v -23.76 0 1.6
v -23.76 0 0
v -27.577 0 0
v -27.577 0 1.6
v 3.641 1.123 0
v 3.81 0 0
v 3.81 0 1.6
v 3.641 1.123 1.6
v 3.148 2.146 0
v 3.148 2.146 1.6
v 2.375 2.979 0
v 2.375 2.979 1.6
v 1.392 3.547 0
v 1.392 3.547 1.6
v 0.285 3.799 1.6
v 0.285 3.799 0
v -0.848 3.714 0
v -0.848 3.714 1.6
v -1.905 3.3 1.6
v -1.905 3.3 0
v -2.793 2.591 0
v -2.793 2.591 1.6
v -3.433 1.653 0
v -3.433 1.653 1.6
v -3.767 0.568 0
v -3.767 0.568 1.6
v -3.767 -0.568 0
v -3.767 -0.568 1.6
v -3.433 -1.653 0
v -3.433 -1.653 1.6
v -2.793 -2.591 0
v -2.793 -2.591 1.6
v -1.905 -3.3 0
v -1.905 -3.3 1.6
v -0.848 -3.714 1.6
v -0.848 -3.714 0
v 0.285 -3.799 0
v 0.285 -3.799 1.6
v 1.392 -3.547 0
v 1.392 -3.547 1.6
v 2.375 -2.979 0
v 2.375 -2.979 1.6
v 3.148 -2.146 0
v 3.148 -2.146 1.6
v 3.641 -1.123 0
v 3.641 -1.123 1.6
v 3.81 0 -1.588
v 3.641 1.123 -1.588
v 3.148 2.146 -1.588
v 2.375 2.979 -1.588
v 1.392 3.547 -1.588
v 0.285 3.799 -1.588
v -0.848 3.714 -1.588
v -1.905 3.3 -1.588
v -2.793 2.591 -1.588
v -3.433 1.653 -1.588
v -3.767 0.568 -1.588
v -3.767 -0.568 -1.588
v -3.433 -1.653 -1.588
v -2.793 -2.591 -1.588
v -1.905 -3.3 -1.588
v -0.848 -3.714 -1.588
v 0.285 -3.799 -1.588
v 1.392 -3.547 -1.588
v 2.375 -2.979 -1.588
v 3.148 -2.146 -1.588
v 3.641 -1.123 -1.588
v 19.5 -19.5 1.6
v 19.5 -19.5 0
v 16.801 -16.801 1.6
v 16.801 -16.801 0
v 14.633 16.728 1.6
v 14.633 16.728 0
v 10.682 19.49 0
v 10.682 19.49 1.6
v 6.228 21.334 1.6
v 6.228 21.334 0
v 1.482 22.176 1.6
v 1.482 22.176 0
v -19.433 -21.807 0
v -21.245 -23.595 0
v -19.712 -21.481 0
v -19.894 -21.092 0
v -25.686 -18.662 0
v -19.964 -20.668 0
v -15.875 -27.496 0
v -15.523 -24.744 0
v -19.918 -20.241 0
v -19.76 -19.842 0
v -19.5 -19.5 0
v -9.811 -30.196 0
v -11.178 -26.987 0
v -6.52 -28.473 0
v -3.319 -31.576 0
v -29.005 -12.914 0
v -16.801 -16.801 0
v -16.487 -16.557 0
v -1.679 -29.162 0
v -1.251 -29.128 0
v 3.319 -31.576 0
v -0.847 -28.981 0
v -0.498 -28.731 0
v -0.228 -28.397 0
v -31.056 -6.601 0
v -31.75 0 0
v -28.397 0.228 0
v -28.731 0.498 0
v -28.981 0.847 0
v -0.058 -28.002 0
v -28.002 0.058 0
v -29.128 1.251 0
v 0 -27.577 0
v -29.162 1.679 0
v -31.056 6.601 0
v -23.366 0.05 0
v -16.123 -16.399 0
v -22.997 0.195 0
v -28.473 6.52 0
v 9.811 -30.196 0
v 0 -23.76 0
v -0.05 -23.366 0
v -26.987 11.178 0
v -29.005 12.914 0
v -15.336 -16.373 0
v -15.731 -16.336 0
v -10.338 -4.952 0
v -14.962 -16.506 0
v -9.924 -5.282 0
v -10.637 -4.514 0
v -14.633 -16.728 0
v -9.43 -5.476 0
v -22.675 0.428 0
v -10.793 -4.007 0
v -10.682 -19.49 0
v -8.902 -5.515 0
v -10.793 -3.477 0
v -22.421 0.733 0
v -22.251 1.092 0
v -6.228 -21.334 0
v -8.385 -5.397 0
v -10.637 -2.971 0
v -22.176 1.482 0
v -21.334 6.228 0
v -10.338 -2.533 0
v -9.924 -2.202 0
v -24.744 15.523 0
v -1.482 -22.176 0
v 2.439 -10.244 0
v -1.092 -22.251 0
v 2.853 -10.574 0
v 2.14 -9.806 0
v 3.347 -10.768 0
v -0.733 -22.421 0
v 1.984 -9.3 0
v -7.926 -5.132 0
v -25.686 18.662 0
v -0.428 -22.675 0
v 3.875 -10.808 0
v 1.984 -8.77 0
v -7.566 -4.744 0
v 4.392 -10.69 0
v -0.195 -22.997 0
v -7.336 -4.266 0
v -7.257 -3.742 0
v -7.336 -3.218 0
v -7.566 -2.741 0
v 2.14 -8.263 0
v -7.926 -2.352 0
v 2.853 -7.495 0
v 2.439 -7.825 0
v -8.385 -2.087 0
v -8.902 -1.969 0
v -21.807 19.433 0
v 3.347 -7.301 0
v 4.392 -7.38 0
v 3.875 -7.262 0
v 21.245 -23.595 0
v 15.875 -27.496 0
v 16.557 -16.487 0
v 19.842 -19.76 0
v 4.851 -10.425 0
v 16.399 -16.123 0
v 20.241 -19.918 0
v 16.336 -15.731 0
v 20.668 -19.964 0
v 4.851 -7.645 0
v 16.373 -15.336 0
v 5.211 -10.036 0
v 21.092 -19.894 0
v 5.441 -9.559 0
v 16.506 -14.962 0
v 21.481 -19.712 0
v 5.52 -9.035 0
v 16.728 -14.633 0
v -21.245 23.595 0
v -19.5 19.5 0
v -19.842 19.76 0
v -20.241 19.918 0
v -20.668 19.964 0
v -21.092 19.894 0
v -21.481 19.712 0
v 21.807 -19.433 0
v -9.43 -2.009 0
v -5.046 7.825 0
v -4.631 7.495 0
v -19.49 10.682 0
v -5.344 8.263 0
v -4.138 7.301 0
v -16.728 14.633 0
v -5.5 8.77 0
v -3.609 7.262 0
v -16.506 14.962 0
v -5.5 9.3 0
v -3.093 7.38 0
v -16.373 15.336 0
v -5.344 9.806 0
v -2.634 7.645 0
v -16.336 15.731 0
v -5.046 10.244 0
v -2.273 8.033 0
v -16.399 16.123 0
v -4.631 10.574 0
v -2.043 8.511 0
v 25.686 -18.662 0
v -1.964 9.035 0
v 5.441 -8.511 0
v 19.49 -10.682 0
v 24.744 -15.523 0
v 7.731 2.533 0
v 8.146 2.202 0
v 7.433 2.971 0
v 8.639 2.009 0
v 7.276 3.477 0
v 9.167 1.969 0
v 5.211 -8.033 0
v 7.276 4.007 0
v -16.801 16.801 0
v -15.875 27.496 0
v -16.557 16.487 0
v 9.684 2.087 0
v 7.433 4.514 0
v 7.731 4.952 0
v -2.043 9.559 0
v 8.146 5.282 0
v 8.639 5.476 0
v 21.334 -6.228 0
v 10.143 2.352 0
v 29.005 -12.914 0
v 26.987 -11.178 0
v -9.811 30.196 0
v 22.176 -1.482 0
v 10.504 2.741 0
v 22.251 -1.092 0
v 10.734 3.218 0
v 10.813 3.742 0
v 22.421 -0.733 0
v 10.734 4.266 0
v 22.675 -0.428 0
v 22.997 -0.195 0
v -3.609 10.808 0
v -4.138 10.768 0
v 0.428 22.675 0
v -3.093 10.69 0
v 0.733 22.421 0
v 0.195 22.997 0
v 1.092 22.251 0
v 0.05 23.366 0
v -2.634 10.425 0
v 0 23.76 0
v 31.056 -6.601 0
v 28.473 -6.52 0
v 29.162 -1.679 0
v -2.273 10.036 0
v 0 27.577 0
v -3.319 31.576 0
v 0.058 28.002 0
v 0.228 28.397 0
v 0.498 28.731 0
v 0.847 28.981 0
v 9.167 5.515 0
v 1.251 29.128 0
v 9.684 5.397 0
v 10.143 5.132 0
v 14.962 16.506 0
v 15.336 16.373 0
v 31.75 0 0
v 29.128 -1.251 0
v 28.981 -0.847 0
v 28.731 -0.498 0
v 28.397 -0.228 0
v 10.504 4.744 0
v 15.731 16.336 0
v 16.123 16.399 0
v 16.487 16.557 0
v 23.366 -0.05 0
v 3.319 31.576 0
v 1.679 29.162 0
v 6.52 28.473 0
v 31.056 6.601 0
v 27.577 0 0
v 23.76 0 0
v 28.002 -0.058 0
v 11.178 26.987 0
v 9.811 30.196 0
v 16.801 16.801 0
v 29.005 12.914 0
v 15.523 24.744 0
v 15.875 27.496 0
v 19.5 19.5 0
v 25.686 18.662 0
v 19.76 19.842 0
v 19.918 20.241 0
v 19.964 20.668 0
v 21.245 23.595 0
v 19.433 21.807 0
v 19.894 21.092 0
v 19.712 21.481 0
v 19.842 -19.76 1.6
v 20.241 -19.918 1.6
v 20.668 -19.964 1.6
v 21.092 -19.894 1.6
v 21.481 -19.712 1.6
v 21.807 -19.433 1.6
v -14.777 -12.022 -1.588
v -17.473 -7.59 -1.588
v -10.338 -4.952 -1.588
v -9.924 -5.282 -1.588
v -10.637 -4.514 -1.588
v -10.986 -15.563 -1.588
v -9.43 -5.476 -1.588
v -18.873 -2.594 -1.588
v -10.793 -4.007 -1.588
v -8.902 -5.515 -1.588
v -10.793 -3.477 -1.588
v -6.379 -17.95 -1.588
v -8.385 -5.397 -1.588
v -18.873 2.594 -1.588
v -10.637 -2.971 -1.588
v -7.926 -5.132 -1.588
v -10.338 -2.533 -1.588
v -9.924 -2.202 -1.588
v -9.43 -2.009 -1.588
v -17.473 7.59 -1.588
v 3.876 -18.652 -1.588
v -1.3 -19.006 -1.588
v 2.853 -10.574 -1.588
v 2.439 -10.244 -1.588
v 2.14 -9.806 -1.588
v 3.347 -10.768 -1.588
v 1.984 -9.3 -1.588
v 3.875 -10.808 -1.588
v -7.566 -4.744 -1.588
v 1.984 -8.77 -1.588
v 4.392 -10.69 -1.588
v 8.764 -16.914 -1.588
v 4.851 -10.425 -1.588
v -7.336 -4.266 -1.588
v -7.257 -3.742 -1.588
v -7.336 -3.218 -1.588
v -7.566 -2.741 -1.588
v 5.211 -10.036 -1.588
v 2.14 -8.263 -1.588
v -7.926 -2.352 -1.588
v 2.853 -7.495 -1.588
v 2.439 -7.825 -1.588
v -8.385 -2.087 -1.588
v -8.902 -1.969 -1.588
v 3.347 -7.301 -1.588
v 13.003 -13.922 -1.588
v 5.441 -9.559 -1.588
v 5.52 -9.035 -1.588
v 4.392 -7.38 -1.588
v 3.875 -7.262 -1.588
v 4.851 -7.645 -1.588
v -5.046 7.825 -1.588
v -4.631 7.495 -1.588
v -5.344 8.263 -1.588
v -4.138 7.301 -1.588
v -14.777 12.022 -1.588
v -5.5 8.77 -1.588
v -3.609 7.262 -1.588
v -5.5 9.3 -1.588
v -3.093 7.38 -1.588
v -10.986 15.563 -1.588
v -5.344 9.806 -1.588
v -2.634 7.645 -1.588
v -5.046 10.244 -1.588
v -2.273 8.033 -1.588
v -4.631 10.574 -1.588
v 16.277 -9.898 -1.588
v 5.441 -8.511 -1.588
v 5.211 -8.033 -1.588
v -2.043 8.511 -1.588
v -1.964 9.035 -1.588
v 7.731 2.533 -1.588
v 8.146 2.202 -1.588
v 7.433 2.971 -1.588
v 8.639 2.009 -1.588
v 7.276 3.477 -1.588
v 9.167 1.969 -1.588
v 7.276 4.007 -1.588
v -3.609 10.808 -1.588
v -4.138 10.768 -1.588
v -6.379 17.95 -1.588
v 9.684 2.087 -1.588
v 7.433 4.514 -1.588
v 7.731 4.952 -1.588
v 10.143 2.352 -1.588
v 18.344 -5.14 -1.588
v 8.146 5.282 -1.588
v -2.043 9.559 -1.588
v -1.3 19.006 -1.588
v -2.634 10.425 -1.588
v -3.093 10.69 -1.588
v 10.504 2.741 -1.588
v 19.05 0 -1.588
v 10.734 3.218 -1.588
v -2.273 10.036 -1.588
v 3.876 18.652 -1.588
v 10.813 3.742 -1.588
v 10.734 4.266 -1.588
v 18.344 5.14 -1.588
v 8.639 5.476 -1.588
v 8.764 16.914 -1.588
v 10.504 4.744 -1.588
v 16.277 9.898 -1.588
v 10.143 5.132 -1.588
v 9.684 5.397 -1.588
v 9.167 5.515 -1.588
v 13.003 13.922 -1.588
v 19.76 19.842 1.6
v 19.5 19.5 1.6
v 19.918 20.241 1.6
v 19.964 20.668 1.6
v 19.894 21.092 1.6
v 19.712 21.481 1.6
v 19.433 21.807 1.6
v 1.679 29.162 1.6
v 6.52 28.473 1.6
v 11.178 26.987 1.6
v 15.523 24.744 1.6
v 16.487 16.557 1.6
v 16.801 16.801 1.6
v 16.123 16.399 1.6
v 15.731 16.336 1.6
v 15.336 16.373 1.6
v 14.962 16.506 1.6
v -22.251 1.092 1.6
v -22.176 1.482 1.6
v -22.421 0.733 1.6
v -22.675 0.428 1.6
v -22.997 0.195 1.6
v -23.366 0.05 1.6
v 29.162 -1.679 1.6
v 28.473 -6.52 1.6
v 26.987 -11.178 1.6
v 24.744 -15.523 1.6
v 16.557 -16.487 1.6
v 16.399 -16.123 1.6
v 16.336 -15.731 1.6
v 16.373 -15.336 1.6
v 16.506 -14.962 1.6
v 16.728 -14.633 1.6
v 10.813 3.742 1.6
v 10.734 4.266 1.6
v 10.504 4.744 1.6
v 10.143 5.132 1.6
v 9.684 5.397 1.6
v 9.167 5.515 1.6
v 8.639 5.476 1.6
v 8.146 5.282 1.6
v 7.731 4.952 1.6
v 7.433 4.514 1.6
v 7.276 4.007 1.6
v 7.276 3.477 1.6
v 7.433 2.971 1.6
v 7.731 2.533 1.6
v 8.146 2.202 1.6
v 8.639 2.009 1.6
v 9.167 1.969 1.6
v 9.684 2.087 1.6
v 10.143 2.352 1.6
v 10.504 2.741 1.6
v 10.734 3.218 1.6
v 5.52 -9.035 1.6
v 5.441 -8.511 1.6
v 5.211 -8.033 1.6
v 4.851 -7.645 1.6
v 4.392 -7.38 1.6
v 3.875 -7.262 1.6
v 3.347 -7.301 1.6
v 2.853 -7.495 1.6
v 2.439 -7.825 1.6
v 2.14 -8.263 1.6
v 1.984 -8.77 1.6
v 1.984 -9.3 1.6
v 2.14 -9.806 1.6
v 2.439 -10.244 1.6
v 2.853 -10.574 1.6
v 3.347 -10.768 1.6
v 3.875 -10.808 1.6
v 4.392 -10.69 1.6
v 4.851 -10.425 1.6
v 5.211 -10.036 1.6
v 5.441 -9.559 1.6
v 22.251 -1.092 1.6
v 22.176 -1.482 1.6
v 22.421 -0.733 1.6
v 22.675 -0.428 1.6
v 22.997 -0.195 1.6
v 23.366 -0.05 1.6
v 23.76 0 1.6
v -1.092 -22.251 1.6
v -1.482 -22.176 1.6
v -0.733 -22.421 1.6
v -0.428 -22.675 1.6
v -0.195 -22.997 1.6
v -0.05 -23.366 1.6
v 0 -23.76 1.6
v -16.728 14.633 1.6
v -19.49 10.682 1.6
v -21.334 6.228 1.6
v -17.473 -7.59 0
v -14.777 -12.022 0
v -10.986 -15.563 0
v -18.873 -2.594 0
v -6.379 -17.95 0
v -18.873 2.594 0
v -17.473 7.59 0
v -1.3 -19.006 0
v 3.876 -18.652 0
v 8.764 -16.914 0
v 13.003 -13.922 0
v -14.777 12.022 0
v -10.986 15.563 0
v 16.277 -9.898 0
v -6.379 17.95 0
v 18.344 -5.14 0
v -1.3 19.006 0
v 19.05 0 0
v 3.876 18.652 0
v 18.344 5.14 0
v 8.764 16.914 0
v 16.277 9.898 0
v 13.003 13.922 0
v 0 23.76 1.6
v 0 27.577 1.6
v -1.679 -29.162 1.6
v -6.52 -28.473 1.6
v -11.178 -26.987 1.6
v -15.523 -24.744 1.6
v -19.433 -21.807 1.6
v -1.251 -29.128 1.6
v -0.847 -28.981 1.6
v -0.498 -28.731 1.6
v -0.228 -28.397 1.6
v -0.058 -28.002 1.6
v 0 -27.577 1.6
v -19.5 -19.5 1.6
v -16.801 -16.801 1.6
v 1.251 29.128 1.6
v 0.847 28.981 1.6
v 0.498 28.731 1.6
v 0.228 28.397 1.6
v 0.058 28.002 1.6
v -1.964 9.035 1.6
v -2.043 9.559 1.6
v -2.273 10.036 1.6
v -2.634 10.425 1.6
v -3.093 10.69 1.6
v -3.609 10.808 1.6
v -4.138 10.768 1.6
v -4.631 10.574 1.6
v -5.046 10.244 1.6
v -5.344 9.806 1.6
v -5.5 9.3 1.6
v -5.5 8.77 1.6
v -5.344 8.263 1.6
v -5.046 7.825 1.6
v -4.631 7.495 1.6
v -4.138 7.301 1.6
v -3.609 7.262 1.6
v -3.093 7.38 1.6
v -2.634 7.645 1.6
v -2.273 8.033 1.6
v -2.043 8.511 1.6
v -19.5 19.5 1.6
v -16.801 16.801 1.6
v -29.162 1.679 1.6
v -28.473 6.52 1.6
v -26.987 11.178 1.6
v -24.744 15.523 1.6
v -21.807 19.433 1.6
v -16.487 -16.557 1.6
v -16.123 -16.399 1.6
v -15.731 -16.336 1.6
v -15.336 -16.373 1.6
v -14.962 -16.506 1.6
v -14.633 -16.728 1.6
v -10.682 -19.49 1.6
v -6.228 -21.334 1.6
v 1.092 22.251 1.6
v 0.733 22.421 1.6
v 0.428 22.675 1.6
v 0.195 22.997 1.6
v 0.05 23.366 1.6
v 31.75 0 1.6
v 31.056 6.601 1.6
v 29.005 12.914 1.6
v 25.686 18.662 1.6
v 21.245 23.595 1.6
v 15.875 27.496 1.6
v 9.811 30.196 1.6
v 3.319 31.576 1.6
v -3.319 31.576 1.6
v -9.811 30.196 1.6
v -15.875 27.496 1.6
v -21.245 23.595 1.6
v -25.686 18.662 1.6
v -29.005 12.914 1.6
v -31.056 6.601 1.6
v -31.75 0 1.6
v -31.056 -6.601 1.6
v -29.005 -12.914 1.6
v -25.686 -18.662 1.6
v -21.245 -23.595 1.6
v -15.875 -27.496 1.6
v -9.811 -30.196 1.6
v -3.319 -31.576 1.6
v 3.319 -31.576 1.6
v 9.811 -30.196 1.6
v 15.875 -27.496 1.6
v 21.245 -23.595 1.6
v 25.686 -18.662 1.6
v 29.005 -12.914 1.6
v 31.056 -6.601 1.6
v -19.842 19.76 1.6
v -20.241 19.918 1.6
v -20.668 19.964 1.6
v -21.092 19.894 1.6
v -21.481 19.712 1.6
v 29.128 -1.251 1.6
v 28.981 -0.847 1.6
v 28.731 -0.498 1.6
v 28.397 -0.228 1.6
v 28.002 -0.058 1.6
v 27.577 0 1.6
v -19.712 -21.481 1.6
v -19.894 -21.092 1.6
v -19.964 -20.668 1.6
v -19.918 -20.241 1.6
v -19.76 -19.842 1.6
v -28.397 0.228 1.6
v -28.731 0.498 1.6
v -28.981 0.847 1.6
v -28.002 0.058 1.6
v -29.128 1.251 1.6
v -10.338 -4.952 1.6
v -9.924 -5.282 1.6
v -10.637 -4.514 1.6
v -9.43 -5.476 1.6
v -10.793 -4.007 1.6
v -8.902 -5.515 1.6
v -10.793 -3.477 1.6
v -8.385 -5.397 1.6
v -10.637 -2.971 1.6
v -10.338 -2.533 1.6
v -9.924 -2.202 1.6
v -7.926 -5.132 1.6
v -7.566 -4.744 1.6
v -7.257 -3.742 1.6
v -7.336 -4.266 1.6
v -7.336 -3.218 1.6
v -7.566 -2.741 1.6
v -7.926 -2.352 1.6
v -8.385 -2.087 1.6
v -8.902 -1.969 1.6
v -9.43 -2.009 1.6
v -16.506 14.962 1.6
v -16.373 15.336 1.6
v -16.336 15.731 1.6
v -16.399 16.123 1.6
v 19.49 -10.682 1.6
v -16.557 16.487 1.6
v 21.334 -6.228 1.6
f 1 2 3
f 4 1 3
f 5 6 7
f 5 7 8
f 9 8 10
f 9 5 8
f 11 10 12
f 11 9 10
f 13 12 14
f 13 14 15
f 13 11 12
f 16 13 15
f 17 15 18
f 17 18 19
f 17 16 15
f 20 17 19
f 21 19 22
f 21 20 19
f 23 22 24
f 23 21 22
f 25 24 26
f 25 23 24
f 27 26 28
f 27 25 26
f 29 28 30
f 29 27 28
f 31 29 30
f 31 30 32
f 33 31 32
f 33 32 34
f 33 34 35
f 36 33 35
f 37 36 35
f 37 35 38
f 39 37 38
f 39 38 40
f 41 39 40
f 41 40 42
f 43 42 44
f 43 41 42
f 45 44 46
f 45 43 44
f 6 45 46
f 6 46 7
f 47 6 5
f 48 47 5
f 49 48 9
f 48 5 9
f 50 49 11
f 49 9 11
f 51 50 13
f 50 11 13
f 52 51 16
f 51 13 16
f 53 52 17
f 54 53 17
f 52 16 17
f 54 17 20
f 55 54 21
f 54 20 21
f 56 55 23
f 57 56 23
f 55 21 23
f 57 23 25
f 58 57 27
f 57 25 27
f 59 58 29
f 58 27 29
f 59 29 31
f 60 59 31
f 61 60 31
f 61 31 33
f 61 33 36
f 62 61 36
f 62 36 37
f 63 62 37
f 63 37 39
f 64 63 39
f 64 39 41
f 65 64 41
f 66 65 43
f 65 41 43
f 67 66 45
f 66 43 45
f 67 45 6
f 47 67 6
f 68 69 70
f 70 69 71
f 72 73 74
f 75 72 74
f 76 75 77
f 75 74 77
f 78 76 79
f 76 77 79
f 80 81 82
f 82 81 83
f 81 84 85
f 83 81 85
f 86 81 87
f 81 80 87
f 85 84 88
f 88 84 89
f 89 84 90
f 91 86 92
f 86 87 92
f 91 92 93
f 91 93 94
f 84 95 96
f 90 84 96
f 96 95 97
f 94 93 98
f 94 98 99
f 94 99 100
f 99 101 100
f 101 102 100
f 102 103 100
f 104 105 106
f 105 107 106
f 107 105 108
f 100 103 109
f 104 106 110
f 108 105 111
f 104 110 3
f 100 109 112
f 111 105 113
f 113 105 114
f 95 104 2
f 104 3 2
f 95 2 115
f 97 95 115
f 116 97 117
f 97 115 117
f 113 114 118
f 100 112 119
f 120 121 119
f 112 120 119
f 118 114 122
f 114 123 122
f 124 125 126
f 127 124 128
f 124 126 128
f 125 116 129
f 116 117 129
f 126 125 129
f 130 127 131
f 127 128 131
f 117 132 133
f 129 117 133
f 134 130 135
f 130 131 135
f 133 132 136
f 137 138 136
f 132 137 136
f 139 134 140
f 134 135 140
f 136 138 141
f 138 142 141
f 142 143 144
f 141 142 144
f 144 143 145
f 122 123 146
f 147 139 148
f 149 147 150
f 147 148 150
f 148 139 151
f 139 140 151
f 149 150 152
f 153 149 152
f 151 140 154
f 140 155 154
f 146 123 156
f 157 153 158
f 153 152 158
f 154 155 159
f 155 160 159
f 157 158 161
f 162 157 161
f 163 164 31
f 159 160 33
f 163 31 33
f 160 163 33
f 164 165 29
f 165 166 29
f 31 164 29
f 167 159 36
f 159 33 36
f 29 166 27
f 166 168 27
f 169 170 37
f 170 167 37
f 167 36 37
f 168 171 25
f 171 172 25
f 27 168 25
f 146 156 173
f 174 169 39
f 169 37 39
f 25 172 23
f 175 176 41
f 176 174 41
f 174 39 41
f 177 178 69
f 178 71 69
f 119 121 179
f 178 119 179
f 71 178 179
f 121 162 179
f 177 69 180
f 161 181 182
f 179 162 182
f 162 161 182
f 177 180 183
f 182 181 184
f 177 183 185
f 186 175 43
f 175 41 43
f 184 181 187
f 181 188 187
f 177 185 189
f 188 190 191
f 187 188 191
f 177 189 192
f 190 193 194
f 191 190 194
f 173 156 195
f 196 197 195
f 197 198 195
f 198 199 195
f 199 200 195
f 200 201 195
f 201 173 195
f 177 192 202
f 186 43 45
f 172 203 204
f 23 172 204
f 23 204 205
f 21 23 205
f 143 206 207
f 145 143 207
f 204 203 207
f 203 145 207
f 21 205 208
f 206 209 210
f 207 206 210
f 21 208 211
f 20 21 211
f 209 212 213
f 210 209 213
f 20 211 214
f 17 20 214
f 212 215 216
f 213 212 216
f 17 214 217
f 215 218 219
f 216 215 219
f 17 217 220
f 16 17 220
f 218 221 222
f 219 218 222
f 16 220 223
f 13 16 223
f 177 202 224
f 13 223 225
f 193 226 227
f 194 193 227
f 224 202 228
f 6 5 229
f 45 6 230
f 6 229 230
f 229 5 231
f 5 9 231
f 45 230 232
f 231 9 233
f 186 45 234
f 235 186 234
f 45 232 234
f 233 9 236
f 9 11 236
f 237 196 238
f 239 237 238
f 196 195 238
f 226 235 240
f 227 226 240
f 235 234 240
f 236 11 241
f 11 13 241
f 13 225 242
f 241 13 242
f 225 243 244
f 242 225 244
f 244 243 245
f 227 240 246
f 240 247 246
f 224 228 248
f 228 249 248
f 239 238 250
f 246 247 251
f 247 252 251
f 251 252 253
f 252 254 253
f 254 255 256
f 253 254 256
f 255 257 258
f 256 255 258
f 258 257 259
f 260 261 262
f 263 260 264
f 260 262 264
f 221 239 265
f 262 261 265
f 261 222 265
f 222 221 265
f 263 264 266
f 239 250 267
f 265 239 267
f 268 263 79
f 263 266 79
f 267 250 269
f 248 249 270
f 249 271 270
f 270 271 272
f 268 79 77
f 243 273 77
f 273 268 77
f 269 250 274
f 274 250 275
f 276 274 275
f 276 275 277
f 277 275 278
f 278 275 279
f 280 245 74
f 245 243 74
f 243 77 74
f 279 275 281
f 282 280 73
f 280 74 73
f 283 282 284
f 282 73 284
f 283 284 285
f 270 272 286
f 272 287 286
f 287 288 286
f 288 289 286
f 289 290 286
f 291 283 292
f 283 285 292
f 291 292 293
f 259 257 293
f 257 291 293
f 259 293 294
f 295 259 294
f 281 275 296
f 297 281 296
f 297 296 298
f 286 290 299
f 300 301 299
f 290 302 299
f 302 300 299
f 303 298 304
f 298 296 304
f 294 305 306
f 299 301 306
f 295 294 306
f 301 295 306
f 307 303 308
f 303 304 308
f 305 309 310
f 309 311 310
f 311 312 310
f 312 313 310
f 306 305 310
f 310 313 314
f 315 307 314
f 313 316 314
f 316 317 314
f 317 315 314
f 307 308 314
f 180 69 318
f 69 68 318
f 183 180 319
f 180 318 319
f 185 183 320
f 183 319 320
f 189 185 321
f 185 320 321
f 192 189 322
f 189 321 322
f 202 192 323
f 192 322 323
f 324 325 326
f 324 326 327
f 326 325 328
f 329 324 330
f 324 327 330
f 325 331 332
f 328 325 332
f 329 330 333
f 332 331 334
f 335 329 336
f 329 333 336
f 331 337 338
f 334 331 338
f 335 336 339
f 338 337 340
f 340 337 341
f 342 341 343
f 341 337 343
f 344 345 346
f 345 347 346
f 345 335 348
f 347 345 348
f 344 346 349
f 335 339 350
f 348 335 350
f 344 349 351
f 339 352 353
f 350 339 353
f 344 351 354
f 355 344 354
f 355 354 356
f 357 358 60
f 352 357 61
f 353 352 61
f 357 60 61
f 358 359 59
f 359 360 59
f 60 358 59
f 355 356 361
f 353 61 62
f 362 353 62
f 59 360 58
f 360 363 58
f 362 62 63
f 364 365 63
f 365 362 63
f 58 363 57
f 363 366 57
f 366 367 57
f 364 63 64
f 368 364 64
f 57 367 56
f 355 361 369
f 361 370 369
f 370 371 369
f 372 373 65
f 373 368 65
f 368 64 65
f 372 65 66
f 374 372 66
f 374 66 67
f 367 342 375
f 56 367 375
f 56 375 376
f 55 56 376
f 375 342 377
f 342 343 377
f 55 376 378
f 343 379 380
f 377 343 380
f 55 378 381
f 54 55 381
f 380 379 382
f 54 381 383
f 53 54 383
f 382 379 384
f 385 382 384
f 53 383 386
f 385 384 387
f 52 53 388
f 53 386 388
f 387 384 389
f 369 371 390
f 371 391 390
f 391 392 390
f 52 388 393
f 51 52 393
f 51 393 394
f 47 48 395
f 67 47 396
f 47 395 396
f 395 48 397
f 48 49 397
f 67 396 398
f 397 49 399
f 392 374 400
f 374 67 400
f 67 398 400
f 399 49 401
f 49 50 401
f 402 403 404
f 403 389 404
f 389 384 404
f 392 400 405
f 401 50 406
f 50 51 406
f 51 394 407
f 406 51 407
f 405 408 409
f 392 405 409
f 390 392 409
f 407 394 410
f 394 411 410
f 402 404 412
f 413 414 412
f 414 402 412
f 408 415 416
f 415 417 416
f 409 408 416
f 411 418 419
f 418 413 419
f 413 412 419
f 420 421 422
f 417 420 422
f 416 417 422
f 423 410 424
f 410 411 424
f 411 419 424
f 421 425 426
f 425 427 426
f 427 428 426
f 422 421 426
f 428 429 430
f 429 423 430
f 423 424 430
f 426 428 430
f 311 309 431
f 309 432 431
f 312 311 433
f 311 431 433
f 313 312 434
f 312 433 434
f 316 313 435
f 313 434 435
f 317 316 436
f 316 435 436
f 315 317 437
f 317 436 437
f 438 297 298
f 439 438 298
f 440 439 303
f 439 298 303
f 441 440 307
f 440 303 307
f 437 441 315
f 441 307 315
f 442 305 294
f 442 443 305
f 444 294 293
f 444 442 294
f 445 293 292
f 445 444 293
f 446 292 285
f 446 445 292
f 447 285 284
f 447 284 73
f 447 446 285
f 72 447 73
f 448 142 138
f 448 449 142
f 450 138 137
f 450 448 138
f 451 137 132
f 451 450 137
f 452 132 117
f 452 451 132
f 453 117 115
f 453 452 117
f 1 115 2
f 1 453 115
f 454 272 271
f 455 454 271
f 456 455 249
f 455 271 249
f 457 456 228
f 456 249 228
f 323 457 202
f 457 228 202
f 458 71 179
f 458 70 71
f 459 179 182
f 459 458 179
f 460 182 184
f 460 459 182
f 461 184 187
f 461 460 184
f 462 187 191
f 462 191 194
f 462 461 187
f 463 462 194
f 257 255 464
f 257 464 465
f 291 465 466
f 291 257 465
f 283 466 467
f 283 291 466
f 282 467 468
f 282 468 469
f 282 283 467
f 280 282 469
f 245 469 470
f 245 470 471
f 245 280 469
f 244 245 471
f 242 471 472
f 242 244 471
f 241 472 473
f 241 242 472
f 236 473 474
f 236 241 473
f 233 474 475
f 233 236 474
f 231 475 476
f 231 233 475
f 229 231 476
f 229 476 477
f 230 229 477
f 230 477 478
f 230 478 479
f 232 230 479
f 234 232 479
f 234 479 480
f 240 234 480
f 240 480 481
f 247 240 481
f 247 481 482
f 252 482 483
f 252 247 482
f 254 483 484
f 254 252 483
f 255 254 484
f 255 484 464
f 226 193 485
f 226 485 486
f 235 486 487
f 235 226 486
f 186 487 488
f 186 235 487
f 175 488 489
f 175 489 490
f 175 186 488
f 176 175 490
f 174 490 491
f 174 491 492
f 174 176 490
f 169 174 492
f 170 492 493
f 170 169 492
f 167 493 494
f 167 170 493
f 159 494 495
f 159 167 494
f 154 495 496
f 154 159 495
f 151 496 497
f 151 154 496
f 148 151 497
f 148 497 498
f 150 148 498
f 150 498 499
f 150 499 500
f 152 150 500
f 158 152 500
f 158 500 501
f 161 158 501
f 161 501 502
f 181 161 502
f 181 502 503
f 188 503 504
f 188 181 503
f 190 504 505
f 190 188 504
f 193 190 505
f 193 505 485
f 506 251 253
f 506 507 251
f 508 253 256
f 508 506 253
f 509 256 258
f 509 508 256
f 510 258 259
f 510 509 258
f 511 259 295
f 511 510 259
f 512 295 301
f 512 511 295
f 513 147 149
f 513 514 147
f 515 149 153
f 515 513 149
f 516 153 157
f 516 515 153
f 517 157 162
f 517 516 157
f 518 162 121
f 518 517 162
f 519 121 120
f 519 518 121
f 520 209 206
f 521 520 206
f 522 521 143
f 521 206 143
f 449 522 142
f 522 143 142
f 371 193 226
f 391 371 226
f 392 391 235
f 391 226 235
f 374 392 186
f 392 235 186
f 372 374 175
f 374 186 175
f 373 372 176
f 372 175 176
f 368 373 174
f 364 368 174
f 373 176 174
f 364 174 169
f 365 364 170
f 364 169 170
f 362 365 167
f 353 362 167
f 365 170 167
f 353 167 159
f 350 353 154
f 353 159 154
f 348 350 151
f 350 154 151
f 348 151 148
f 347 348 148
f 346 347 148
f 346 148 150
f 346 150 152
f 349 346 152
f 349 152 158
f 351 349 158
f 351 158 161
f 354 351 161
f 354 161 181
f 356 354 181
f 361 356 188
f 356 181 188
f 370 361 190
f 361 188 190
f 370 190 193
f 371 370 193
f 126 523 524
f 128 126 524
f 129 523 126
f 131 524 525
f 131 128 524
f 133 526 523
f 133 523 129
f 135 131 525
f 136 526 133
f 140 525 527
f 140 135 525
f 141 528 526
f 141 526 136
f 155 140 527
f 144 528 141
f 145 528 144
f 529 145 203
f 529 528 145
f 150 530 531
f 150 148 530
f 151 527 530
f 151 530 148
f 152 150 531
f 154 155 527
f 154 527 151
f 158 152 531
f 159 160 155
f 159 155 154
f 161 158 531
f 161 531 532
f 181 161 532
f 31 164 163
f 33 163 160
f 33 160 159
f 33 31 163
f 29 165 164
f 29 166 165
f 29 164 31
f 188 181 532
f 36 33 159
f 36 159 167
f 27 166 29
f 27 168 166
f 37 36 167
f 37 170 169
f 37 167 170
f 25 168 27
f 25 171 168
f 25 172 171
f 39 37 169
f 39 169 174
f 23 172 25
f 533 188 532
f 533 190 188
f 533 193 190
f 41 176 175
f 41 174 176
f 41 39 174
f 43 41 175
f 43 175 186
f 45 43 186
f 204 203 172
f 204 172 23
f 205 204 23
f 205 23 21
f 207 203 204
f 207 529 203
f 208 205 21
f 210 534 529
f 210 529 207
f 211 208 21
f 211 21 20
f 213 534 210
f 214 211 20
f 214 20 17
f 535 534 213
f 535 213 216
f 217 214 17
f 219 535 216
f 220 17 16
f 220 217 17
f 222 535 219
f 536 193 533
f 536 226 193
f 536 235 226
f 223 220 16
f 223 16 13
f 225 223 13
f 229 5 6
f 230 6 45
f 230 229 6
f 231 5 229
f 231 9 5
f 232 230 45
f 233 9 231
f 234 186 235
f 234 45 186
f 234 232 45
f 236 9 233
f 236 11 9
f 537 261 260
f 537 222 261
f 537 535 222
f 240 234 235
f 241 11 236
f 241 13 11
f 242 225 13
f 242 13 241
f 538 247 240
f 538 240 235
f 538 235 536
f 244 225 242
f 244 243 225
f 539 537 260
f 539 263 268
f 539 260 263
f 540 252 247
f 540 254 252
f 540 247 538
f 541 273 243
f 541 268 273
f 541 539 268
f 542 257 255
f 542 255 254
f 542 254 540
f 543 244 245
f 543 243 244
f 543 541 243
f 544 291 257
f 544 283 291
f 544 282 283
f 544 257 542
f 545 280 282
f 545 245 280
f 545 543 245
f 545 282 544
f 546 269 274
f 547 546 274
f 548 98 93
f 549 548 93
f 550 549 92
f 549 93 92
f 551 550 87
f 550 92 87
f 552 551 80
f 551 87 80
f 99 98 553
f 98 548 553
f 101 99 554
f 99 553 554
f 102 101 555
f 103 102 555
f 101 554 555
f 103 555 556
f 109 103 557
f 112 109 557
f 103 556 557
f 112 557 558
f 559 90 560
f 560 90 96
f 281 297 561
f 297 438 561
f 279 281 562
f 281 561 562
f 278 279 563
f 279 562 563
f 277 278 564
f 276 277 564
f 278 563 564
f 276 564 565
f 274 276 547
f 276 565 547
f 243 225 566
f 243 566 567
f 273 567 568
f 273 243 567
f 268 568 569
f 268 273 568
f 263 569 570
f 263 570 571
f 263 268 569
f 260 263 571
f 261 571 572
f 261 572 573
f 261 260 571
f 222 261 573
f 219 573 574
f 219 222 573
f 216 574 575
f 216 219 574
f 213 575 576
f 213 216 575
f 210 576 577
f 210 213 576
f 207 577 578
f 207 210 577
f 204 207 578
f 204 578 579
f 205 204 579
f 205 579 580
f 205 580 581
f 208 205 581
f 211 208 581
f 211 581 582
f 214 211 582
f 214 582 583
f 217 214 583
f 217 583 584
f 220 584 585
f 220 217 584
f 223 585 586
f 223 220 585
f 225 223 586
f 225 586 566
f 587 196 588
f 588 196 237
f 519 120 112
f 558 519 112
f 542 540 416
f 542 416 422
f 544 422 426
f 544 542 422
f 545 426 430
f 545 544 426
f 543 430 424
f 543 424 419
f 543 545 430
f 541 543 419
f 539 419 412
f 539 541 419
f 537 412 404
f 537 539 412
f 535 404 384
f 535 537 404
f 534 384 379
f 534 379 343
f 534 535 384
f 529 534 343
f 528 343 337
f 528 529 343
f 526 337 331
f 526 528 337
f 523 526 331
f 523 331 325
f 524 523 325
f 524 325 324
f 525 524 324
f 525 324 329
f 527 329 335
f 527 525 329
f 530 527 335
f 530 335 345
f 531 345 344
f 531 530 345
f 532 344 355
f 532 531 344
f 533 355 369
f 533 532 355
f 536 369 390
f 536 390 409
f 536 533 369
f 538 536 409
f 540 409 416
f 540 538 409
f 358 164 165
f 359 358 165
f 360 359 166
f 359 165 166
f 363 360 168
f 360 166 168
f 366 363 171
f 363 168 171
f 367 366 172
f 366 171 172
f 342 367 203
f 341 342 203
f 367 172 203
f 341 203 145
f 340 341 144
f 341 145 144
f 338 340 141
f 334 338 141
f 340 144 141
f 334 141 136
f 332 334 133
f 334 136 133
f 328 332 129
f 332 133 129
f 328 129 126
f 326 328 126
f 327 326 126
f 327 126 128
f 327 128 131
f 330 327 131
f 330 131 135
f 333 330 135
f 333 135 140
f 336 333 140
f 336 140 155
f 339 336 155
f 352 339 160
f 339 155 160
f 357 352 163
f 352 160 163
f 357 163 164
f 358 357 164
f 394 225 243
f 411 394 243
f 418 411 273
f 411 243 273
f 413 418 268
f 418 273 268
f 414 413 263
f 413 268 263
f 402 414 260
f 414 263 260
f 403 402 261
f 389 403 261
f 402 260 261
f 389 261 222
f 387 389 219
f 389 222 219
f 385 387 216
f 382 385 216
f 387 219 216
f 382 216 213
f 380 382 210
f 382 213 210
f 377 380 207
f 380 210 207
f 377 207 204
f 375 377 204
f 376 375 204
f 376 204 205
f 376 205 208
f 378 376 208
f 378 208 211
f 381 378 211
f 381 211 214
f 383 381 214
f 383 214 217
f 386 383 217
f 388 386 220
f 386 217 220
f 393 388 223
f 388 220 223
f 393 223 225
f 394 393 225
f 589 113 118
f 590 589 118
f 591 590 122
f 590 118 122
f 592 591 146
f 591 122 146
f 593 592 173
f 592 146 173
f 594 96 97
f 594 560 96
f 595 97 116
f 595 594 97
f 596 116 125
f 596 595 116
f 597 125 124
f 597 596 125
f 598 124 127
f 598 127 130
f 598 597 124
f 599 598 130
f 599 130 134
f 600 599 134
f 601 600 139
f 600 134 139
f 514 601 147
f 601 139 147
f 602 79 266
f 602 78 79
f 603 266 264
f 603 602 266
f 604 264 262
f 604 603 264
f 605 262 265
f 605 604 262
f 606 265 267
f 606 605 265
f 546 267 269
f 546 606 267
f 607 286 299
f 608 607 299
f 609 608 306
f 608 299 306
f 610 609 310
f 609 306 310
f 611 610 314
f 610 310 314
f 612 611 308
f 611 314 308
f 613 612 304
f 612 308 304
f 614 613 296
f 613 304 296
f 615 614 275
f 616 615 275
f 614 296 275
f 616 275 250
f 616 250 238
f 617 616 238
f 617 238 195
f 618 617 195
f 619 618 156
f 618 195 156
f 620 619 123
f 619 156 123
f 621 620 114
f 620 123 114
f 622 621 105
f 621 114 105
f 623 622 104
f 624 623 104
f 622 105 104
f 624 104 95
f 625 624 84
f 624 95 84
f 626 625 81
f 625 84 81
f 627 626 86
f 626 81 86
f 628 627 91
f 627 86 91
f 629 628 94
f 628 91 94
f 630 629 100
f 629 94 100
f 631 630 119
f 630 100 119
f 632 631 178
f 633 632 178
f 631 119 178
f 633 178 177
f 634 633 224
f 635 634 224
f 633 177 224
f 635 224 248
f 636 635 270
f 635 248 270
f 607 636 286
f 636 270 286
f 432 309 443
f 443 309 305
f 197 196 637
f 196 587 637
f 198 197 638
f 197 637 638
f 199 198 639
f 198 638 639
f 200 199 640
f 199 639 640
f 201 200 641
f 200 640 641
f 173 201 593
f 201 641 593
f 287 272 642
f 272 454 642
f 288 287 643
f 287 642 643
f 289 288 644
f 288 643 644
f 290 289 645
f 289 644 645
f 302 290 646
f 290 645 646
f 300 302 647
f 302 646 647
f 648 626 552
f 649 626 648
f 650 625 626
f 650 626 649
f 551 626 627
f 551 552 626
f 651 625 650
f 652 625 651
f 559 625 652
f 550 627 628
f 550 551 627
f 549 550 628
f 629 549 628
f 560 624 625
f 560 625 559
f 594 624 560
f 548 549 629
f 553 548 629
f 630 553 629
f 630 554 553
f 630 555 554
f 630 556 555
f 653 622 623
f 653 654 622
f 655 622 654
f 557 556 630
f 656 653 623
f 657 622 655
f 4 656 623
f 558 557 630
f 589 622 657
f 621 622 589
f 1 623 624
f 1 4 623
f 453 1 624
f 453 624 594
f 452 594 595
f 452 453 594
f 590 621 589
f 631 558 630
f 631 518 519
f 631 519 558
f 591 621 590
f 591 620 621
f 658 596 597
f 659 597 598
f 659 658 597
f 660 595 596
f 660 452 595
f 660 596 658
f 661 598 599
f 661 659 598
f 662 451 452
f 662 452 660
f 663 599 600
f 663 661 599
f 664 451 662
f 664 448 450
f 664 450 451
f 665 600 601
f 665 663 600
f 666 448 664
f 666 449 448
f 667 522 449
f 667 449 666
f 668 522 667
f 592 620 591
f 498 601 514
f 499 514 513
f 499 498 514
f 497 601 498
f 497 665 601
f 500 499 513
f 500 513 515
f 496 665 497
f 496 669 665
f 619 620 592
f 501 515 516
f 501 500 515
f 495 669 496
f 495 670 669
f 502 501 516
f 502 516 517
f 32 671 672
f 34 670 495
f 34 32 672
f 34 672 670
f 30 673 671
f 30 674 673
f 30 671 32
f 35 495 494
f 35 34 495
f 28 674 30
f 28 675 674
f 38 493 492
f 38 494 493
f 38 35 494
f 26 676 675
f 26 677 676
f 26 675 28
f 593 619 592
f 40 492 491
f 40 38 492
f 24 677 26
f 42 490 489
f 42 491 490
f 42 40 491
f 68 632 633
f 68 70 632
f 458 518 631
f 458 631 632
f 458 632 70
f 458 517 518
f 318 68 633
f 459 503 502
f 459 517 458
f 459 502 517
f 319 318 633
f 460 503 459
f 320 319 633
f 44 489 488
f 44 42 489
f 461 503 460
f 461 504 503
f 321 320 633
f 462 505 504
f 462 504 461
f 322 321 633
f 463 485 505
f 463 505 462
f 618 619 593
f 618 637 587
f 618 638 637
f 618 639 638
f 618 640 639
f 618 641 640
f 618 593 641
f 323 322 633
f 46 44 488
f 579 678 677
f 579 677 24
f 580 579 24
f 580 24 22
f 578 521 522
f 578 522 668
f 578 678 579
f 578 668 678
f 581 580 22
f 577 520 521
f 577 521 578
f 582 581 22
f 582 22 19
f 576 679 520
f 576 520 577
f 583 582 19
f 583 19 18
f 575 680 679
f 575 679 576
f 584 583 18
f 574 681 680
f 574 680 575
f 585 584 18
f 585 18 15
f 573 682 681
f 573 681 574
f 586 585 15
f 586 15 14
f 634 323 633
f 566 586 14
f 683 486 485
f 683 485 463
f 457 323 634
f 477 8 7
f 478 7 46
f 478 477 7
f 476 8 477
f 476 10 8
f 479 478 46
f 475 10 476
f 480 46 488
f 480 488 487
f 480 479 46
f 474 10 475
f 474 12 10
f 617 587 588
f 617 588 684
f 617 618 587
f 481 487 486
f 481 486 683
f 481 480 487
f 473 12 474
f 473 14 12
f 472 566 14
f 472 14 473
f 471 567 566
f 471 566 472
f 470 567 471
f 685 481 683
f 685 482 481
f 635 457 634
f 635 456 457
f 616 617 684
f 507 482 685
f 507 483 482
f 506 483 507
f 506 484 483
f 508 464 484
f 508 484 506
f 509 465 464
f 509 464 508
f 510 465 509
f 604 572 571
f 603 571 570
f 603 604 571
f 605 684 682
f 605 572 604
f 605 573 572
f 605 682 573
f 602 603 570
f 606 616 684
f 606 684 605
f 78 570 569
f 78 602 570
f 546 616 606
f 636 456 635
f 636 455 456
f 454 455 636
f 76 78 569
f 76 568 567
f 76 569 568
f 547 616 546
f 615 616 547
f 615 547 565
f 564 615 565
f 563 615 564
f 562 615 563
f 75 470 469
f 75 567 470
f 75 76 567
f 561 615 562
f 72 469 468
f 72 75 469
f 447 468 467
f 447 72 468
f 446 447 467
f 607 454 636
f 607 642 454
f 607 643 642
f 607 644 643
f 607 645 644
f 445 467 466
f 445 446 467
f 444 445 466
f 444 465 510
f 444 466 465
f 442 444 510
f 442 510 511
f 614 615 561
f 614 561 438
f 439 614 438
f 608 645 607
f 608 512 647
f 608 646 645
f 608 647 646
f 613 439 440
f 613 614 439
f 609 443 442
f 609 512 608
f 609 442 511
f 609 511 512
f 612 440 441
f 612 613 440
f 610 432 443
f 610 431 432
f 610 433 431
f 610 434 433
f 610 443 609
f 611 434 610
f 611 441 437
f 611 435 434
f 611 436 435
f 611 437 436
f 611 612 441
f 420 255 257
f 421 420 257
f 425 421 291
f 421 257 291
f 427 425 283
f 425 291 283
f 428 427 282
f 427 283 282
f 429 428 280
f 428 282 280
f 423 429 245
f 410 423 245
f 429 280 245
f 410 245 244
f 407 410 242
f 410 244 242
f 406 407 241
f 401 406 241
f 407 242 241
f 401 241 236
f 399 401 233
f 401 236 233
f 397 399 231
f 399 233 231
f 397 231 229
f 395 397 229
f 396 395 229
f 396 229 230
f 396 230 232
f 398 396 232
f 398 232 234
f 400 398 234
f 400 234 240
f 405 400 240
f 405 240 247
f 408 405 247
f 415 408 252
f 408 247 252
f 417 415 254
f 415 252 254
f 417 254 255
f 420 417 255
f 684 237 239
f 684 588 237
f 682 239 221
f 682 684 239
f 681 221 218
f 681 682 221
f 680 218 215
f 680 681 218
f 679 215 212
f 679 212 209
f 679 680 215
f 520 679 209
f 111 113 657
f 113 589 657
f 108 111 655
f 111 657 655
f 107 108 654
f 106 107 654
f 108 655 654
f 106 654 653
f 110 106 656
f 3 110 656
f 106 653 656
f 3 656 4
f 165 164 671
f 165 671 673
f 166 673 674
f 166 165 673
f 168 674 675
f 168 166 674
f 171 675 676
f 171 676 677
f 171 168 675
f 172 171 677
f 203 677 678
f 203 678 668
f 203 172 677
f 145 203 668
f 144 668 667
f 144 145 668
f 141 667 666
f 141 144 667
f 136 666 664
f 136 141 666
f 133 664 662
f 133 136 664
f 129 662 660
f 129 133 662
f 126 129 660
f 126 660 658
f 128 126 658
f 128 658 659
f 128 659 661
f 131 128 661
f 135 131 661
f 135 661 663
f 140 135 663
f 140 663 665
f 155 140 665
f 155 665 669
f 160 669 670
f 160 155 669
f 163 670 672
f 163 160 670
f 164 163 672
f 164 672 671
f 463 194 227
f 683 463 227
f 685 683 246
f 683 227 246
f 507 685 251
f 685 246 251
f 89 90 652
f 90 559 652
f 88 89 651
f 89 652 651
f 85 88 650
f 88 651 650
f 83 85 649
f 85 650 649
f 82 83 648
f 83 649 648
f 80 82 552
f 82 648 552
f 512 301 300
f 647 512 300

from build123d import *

# Parameters (mm, degrees)
F0_R     = 31.75
F0_R_2   = 19.05
F0_R_3   = 1.778
F0_R_4   = 3.81
F1_DEPTH = 1.6002
F2_R     = 1.5875
F3_DEPTH = 1.5875


with BuildPart() as f1:
    # F0 (on Top) → F1 (new body)
    with BuildSketch(Plane.XY):
        Circle(F0_R)
        with BuildLine():
            ThreePointArc((-15.715448, -15.715448), (-8.505139, -20.533223), (0, -22.225))
            Line((0, -22.225), (0, -29.21))
            ThreePointArc((0, -29.21), (-11.178183, -26.986521), (-20.654589, -20.654589))
            Line((-20.654589, -20.654589), (-15.715448, -15.715448))
        make_face(mode=Mode.SUBTRACT)
        with BuildLine():
            ThreePointArc((15.715448, -15.715448), (20.533223, -8.505139), (22.225, 0))
            Line((22.225, 0), (29.21, 0))
            ThreePointArc((29.21, 0), (26.986521, -11.178183), (20.654589, -20.654589))
            Line((20.654589, -20.654589), (15.715448, -15.715448))
        make_face(mode=Mode.SUBTRACT)
        with BuildLine():
            ThreePointArc((-15.715448, 15.715448), (-20.533223, 8.505139), (-22.225, 0))
            Line((-22.225, 0), (-29.21, 0))
            ThreePointArc((-29.21, 0), (-26.986521, 11.178183), (-20.654589, 20.654589))
            Line((-20.654589, 20.654589), (-15.715448, 15.715448))
        make_face(mode=Mode.SUBTRACT)
        Circle(F0_R_2, mode=Mode.SUBTRACT)
        with BuildLine():
            ThreePointArc((15.715448, 15.715448), (8.505139, 20.533223), (0, 22.225))
            Line((0, 22.225), (0, 29.21))
            ThreePointArc((0, 29.21), (11.178183, 26.986521), (20.654589, 20.654589))
            Line((20.654589, 20.654589), (15.715448, 15.715448))
        make_face(mode=Mode.SUBTRACT)
        Circle(F0_R_2)
        with Locations((-9.034618, -3.742261)):
            Circle(F0_R_3, mode=Mode.SUBTRACT)
        with Locations((3.742261, -9.034618)):
            Circle(F0_R_3, mode=Mode.SUBTRACT)
        with Locations((-3.742261, 9.034618)):
            Circle(F0_R_3, mode=Mode.SUBTRACT)
        Circle(F0_R_4, mode=Mode.SUBTRACT)
        with Locations((9.034618, 3.742261)):
            Circle(F0_R_3, mode=Mode.SUBTRACT)
    extrude(amount=F1_DEPTH)

    # F2
    f2_edges = [f1.edges().sort_by_distance(p)[0] for p in [
        (-20.654589, 20.654589, 0.8001),
        (0, 29.21, 0.8001),
        (22.225, 0, 0.8001),
        (-15.715448, -15.715448, 0.8001),
        (-29.21, 0, 0.8001),
        (-20.654589, -20.654589, 0.8001),
        (15.715448, -15.715448, 0.8001),
        (0, 22.225, 0.8001),
        (15.715448, 15.715448, 0.8001),
        (20.654589, -20.654589, 0.8001),
        (0, -29.21, 0.8001),
        (-22.225, 0, 0.8001),
        (20.654589, 20.654589, 0.8001),
        (29.21, 0, 0.8001),
        (0, -22.225, 0.8001),
        (-15.715448, 15.715448, 0.8001),
    ]]
    fillet(f2_edges, radius=F2_R)


with BuildPart() as f3:
    # F0 (on Top) → F3 (new body)
    with BuildSketch(Plane.XY):
        Circle(F0_R_2)
        with Locations((-9.034618, -3.742261)):
            Circle(F0_R_3, mode=Mode.SUBTRACT)
        with Locations((3.742261, -9.034618)):
            Circle(F0_R_3, mode=Mode.SUBTRACT)
        with Locations((-3.742261, 9.034618)):
            Circle(F0_R_3, mode=Mode.SUBTRACT)
        Circle(F0_R_4, mode=Mode.SUBTRACT)
        with Locations((9.034618, 3.742261)):
            Circle(F0_R_3, mode=Mode.SUBTRACT)
    extrude(amount=-F3_DEPTH)


solid = Compound([f1.part, f3.part])
